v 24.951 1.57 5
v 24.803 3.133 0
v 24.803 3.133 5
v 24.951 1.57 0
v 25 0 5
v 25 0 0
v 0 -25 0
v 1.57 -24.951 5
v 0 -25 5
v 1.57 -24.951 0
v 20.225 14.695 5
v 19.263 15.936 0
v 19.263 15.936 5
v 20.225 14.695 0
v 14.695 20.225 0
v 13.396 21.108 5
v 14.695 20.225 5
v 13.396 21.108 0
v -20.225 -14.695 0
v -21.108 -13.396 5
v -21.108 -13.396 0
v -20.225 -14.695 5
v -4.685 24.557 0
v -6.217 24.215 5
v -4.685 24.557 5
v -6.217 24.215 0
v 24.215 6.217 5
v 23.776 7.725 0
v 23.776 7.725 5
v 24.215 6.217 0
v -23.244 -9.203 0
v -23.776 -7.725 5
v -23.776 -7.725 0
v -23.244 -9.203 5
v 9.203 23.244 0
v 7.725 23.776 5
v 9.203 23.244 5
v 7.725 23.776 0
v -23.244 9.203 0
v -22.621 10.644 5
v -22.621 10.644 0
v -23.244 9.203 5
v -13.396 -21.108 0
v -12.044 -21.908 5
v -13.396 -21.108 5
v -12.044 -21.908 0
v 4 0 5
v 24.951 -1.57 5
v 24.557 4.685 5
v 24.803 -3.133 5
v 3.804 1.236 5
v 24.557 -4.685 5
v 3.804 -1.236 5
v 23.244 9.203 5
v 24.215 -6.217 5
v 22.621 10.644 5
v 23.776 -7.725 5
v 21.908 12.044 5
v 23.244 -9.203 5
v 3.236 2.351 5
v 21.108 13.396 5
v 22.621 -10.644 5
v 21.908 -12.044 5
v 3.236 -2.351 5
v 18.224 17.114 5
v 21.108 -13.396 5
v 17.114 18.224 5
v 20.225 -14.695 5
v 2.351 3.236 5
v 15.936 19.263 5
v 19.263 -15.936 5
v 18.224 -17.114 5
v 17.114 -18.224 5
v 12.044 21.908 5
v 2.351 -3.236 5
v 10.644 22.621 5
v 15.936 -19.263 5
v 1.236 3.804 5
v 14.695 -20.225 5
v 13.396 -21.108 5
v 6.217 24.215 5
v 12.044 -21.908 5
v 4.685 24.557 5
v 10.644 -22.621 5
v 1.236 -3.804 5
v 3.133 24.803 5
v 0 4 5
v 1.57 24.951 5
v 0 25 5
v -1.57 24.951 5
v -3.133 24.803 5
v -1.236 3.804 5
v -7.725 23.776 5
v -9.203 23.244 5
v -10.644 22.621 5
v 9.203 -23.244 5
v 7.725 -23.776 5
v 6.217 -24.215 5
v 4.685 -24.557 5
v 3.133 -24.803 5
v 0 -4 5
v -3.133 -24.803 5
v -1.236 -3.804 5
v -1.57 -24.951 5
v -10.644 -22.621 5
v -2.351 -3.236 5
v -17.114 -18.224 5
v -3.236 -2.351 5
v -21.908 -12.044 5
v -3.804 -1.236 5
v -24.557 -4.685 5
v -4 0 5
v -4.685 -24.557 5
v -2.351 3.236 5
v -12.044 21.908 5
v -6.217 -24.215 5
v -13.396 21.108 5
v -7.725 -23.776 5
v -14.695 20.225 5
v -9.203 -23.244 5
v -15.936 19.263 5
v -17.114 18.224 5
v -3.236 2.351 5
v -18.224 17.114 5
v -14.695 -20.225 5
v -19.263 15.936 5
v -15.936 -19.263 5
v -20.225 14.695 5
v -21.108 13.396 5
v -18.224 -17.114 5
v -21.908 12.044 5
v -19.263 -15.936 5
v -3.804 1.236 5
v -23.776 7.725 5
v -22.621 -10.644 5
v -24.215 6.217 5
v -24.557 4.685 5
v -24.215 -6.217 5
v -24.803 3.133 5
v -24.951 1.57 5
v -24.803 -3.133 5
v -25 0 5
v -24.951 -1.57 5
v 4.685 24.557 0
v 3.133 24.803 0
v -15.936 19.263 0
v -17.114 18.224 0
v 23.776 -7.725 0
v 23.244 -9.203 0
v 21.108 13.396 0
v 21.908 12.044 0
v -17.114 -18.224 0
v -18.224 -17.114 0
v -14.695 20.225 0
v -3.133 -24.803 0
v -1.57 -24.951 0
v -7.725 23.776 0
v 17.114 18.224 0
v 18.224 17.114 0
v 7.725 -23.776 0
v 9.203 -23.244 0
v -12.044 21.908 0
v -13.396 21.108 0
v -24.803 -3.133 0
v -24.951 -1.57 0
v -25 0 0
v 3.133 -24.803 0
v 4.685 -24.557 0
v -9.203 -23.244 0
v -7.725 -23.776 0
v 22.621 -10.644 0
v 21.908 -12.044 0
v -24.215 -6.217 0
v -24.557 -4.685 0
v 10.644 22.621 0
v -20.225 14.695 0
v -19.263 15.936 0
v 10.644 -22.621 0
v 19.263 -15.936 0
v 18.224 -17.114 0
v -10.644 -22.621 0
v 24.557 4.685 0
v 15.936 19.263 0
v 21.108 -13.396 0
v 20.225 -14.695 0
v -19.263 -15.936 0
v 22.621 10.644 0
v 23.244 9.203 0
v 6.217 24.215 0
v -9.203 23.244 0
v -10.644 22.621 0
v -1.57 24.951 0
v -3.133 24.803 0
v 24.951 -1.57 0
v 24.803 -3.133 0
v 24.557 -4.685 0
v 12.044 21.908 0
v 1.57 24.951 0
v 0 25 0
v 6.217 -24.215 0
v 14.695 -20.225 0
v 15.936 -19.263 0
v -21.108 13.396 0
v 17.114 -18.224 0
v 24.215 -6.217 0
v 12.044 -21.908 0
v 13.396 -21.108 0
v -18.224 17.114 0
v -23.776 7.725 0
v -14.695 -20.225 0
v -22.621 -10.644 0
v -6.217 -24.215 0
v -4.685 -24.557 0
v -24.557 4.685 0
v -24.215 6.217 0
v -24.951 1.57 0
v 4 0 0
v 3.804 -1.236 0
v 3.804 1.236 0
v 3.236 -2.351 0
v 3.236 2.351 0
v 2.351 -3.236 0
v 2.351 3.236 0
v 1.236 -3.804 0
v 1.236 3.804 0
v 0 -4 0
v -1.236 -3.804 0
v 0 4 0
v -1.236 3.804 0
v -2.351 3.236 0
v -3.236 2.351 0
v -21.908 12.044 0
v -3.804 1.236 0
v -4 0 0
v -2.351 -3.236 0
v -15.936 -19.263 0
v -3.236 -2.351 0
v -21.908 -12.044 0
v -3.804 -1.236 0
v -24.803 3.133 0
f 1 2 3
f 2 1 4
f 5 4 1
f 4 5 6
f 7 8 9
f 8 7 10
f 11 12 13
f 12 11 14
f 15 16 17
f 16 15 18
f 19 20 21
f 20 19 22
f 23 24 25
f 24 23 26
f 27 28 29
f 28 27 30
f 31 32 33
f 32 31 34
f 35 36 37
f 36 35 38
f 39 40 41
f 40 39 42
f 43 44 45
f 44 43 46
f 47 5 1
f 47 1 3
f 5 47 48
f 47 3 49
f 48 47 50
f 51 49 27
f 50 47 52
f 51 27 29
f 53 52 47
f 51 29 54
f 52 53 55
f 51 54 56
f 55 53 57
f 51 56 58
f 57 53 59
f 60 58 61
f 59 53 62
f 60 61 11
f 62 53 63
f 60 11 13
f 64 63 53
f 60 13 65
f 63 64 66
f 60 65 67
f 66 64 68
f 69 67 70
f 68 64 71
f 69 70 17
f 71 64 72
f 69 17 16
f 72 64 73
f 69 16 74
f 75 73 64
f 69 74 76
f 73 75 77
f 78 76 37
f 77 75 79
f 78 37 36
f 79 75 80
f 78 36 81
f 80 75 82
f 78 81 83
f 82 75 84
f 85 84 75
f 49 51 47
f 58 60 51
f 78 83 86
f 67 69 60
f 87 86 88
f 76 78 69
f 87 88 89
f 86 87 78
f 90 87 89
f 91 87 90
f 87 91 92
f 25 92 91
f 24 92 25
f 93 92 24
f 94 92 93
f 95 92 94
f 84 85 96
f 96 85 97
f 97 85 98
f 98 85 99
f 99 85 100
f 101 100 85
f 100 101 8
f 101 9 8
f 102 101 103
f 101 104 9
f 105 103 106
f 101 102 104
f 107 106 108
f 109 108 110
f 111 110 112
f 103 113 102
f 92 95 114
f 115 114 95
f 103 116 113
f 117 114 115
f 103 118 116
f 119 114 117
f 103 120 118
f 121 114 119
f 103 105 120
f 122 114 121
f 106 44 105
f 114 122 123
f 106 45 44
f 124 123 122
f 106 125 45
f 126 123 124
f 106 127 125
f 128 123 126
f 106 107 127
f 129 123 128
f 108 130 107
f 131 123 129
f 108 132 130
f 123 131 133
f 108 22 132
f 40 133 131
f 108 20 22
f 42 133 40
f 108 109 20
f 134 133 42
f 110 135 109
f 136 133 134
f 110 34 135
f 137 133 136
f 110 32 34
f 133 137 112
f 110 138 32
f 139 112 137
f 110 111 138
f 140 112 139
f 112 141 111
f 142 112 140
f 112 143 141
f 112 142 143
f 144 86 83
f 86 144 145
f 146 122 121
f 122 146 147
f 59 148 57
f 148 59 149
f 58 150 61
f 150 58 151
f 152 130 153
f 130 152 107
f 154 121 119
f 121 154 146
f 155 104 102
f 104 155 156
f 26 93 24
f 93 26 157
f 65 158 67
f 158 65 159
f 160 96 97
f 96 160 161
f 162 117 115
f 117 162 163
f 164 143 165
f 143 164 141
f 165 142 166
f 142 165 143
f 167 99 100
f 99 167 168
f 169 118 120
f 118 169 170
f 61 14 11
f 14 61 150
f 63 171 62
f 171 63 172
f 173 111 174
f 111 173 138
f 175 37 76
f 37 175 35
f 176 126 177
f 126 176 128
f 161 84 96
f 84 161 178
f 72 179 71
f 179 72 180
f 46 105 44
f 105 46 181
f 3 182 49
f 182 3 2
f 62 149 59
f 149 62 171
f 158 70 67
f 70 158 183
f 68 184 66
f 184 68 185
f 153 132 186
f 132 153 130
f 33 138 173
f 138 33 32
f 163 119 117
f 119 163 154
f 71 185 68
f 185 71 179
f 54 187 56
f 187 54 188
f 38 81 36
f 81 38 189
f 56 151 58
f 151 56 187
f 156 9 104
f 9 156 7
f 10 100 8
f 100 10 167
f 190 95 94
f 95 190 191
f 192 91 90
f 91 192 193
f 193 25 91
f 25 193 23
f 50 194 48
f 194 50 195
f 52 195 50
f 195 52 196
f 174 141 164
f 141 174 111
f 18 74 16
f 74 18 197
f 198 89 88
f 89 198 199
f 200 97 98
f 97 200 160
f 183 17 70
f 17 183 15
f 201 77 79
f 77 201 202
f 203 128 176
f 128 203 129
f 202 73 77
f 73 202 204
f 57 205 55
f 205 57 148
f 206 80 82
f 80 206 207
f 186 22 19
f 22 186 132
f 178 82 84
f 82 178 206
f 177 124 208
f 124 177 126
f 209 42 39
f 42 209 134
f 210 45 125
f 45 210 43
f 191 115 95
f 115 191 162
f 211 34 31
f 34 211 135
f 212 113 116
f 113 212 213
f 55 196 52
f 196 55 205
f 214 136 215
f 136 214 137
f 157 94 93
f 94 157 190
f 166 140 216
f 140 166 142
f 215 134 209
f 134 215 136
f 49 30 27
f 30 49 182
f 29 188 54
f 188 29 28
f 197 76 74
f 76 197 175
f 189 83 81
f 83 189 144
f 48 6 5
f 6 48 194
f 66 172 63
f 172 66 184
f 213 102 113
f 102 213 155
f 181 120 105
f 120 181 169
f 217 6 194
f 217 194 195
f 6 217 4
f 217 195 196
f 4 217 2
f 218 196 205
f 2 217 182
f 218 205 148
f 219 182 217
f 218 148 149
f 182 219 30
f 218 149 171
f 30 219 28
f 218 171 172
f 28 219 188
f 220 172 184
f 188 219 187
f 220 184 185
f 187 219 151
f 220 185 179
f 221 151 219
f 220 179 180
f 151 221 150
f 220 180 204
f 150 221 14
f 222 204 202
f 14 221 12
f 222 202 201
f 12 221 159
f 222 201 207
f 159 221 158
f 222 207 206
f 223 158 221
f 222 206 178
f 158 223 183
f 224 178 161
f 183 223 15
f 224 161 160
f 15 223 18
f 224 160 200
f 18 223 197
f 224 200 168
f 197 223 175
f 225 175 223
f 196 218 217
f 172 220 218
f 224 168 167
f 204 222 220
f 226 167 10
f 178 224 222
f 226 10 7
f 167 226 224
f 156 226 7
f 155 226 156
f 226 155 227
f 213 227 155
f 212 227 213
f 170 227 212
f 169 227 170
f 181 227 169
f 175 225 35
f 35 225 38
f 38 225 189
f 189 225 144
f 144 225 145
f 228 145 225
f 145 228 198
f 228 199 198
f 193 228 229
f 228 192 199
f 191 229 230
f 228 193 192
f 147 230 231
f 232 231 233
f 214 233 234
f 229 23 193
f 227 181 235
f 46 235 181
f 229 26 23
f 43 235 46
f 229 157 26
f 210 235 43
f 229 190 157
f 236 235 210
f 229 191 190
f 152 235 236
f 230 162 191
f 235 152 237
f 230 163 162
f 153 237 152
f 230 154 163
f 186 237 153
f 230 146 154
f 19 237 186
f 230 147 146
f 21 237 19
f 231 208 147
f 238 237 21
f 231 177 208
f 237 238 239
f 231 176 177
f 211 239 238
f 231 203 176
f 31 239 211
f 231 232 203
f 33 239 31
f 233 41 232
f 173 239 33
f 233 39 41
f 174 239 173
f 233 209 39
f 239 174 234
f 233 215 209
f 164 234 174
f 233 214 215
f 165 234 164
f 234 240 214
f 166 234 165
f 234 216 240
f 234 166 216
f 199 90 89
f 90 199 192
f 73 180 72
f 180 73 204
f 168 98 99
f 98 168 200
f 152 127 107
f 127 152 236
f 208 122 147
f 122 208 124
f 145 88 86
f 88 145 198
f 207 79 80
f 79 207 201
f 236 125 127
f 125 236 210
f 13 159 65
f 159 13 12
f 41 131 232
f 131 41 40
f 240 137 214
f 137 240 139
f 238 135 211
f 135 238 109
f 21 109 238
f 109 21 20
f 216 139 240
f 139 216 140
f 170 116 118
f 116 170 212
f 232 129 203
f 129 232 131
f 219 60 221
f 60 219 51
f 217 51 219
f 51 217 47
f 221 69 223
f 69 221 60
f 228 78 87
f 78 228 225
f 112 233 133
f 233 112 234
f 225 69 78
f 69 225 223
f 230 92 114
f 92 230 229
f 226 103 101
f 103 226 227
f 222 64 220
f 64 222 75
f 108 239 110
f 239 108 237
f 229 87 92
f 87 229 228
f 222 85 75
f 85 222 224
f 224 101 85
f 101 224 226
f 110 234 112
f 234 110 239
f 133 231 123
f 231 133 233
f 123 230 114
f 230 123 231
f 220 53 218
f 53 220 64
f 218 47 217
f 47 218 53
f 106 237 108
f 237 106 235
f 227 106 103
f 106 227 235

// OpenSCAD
//-- Parámetros de la rueda
grosor=5;
diametro=50;
diam_eje=8;

//-- Construcción de la rueda a partir de los parámetros
difference(){
    //-- Base de la rueda
    cylinder(r=diametro/2,h=grosor,$fn=100);
    
    //-- Taladro del eje
    cylinder(r=diam_eje/2,h=3*grosor,$fn=20,center=true);
}
